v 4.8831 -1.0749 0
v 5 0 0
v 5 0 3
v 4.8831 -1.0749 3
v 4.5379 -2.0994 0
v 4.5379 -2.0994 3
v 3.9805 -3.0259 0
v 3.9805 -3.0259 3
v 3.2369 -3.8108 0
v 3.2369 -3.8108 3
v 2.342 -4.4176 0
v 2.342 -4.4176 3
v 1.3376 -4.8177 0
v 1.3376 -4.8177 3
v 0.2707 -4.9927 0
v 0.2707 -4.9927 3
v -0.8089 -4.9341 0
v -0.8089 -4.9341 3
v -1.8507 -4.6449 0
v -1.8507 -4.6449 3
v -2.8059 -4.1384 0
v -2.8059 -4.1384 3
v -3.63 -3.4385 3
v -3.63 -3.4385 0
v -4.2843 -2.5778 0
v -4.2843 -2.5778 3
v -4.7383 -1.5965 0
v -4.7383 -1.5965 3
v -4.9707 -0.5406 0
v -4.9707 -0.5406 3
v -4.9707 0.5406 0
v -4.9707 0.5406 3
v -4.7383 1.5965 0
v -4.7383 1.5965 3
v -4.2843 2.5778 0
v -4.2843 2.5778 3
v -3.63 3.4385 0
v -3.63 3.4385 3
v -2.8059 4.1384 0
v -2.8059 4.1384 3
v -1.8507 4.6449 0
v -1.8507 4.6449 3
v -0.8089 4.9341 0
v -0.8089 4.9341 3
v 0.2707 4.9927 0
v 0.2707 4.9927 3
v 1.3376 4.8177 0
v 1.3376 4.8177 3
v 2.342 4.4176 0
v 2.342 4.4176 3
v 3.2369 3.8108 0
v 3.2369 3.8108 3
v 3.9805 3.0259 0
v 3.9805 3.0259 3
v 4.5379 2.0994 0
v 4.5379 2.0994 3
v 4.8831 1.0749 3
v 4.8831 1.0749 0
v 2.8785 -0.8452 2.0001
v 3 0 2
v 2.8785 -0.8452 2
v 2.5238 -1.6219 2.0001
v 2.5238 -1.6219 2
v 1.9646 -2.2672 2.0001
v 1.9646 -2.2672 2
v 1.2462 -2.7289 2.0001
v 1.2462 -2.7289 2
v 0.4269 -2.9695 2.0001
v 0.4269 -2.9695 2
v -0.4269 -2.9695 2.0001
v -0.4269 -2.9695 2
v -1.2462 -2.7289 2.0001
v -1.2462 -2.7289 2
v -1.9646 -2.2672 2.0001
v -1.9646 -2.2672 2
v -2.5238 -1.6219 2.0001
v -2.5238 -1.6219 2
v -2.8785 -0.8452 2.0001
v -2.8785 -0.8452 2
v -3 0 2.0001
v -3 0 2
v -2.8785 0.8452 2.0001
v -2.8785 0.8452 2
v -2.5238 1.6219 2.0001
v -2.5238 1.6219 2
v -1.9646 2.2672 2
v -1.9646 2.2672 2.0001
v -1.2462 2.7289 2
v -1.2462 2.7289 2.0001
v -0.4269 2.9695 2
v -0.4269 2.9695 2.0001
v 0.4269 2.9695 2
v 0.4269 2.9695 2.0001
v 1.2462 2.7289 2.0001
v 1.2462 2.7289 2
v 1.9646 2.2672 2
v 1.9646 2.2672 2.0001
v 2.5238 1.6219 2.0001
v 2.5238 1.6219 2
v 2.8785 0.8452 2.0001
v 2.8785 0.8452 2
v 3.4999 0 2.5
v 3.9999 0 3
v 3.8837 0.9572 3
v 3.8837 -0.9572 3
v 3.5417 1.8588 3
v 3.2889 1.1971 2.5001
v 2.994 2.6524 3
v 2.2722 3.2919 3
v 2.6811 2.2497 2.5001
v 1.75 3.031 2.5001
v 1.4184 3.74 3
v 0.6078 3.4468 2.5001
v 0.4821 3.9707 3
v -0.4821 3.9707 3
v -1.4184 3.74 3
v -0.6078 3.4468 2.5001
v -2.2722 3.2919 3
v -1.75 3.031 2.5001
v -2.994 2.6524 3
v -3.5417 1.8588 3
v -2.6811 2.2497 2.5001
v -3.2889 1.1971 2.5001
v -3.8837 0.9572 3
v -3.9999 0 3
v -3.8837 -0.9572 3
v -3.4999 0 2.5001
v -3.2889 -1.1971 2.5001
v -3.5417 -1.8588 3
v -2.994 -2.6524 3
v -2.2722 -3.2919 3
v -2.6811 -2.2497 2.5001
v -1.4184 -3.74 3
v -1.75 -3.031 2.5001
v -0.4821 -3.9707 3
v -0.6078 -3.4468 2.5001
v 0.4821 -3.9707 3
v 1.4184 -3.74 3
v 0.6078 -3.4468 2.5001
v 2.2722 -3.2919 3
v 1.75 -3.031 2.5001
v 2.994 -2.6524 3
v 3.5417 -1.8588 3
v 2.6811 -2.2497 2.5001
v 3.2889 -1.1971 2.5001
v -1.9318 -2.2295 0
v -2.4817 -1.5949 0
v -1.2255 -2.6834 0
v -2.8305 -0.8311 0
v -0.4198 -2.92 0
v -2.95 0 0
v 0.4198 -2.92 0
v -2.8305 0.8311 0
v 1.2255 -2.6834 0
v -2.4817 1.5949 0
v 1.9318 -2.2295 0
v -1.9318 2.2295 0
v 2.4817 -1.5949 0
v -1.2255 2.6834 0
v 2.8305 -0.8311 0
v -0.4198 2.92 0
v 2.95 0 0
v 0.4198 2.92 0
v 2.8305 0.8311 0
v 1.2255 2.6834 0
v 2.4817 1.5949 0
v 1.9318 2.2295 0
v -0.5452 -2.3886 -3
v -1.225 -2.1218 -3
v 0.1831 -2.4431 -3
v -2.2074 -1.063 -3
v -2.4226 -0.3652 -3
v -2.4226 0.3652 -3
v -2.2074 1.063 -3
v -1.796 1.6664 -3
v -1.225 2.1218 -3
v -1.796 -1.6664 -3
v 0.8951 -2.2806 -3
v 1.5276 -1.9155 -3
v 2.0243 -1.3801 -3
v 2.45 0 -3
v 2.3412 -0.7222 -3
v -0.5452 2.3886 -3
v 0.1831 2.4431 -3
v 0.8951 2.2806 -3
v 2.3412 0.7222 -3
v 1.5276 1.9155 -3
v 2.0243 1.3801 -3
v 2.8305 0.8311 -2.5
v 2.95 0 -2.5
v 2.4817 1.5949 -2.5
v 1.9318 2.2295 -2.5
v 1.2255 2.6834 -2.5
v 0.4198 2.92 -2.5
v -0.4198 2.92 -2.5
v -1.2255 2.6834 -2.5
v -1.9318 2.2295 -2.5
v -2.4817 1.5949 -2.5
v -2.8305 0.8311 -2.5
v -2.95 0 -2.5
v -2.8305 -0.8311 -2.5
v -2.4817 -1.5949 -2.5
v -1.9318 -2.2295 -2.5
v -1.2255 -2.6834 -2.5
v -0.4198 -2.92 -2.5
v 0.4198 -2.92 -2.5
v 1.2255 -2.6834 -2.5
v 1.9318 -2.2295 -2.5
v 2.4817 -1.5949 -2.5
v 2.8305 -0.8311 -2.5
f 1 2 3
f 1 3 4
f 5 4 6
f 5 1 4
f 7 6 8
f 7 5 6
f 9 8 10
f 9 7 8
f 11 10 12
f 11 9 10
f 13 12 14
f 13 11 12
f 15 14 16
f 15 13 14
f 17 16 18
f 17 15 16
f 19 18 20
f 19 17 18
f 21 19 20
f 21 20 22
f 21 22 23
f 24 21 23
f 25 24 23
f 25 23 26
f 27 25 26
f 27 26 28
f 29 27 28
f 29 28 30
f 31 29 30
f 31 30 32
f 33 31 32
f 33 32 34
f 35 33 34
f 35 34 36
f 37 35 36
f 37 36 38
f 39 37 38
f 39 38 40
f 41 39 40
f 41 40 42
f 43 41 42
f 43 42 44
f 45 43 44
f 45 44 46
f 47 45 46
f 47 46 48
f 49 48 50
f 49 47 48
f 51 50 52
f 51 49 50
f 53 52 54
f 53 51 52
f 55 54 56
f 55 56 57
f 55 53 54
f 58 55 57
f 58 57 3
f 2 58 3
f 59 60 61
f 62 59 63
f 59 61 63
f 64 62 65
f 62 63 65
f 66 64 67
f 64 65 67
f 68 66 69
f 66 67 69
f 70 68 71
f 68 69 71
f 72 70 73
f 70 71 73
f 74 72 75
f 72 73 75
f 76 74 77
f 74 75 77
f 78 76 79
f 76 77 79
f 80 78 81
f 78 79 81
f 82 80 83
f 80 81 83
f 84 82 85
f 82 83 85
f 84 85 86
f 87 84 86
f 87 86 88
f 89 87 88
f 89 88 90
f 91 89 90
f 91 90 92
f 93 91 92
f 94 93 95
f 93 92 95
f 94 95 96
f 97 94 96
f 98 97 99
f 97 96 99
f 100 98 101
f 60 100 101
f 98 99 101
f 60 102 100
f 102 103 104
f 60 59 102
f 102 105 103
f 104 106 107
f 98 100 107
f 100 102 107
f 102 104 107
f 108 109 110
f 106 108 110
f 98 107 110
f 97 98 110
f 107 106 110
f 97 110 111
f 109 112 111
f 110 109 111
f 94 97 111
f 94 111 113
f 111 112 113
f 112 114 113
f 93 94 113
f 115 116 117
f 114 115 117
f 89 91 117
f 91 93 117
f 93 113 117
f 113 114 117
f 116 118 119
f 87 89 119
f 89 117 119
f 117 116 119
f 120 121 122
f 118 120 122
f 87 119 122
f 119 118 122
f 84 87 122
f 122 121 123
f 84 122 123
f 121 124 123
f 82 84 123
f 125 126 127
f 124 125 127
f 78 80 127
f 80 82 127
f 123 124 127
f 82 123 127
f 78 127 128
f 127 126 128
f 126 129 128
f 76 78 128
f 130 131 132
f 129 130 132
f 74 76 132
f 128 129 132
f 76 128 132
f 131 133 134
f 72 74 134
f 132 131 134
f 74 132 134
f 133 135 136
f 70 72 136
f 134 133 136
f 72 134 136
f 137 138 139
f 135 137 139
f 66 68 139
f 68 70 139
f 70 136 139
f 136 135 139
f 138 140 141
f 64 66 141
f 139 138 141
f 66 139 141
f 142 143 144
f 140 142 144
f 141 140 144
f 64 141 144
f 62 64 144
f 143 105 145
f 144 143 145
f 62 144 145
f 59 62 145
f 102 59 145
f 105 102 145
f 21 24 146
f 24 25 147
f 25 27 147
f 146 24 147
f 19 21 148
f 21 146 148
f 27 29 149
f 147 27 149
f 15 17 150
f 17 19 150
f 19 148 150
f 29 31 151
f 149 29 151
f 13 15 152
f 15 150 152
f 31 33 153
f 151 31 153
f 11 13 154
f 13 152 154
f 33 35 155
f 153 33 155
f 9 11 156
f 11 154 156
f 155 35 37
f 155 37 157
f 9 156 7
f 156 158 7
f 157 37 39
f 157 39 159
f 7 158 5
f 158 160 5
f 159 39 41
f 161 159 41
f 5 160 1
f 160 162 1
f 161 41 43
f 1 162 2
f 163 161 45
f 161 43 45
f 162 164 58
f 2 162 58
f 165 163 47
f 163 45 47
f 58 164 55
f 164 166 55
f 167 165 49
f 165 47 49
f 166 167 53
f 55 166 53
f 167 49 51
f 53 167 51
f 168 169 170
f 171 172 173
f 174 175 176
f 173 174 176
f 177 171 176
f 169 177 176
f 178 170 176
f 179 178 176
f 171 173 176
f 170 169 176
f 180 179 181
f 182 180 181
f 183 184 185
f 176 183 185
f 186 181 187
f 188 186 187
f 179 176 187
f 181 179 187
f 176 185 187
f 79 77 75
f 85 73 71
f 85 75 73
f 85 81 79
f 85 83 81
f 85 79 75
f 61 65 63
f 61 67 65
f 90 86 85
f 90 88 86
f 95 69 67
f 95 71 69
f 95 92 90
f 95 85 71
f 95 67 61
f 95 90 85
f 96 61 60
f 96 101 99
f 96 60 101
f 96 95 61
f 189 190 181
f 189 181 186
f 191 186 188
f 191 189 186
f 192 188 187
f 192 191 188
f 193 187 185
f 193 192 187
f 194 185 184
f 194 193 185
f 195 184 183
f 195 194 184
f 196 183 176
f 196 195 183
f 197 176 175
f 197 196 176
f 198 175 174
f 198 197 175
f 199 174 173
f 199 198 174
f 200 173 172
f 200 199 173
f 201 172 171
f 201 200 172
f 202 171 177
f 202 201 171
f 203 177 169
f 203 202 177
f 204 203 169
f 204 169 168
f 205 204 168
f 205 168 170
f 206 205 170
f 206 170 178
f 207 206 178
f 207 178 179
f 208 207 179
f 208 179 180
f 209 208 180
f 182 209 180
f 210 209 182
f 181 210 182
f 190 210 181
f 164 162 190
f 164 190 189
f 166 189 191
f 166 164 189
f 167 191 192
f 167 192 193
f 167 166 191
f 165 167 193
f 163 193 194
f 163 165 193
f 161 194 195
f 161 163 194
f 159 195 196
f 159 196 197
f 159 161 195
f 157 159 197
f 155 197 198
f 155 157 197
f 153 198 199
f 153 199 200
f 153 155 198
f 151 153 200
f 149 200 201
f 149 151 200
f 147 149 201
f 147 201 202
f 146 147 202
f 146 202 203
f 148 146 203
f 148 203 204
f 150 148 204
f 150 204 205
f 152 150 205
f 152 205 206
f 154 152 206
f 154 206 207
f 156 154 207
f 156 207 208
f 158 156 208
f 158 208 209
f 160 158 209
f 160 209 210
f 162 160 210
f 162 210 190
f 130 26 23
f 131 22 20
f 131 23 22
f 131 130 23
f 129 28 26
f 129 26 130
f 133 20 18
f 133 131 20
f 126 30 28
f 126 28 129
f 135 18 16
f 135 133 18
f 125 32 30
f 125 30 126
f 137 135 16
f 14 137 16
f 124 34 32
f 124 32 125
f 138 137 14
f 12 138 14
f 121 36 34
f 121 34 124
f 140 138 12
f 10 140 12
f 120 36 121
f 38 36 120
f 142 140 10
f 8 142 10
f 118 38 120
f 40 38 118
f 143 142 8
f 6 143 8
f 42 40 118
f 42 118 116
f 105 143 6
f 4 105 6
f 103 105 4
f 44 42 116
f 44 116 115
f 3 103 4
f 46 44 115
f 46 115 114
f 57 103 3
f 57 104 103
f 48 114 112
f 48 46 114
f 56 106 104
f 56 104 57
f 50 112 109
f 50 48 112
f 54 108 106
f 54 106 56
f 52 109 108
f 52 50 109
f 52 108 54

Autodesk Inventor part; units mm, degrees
ref_plane "YZ Plane" through (0, 0, 0) normal (1, 0, 0) x (0, 1, 0)
ref_plane "XZ Plane" through (0, 0, 0) normal (0, 1, 0) x (-1, 0, 0)
ref_plane "XY Plane" through (0, 0, 0) normal (0, 0, 1) x (1, 0, 0)
sketch "Sketch1" plane through (0, 0, 0) normal (0, 0, 1) x (1, 0, 0)
  circle A0 centre (0, 0) radius 3 projected
  circle A1 centre (0, 0) radius 3
  point P0 (0, 0)
  dimension "d0" = 6
extrude "Extrusion1" add sketch "Sketch1" against normal blind 3
sketch "Sketch2" plane through (0, 0, 0) normal (0, 0, 1) x (1, 0, 0)
  circle A0 centre (0, 0) radius 3 projected
  circle A1 centre (0, 0) radius 11 projected
  circle A2 centre (0, 0) radius 3 projected
  circle A3 centre (8, 0) radius 1.5 projected
  circle A4 centre (0, 8) radius 1.5 projected
  circle A5 centre (-8, 0) radius 1.5 projected
  circle A6 centre (0, -8) radius 1.5 projected
  circle A7 centre (0, 0) radius 5
  point P0 (0, 0)
  dimension "d3" = 10
extrude "Extrusion2" add sketch "Sketch2" along normal blind 2 contours A0 | A7
sketch "Sketch3" plane through (0, 0, 2) normal (0, 0, 1) x (1, 0, 0)
  circle A0 centre (0, 0) radius 5 projected
  circle A1 centre (0, 0) radius 3 projected
  circle A2 centre (0, 0) radius 3
  point P0 (0, 0)
  dimension "d6" = 6
extrude "Extrusion3" add sketch "Sketch3" along normal blind 1
chamfer "Chamfer1" distance 1 angle 45 1 edges at (-3, 0, 3)
thicken "Thicken1" operation add thickness 0.05 both sides no extend neighbours yes toward (-0.9967573, 0.0804666, 0) faces at (2.9903, -0.2414, -2)
chamfer "Chamfer2" distance 0.5 angle 45 1 edges at (-2.95, 0, -3)
properties part number "encoder_ma_holder"
